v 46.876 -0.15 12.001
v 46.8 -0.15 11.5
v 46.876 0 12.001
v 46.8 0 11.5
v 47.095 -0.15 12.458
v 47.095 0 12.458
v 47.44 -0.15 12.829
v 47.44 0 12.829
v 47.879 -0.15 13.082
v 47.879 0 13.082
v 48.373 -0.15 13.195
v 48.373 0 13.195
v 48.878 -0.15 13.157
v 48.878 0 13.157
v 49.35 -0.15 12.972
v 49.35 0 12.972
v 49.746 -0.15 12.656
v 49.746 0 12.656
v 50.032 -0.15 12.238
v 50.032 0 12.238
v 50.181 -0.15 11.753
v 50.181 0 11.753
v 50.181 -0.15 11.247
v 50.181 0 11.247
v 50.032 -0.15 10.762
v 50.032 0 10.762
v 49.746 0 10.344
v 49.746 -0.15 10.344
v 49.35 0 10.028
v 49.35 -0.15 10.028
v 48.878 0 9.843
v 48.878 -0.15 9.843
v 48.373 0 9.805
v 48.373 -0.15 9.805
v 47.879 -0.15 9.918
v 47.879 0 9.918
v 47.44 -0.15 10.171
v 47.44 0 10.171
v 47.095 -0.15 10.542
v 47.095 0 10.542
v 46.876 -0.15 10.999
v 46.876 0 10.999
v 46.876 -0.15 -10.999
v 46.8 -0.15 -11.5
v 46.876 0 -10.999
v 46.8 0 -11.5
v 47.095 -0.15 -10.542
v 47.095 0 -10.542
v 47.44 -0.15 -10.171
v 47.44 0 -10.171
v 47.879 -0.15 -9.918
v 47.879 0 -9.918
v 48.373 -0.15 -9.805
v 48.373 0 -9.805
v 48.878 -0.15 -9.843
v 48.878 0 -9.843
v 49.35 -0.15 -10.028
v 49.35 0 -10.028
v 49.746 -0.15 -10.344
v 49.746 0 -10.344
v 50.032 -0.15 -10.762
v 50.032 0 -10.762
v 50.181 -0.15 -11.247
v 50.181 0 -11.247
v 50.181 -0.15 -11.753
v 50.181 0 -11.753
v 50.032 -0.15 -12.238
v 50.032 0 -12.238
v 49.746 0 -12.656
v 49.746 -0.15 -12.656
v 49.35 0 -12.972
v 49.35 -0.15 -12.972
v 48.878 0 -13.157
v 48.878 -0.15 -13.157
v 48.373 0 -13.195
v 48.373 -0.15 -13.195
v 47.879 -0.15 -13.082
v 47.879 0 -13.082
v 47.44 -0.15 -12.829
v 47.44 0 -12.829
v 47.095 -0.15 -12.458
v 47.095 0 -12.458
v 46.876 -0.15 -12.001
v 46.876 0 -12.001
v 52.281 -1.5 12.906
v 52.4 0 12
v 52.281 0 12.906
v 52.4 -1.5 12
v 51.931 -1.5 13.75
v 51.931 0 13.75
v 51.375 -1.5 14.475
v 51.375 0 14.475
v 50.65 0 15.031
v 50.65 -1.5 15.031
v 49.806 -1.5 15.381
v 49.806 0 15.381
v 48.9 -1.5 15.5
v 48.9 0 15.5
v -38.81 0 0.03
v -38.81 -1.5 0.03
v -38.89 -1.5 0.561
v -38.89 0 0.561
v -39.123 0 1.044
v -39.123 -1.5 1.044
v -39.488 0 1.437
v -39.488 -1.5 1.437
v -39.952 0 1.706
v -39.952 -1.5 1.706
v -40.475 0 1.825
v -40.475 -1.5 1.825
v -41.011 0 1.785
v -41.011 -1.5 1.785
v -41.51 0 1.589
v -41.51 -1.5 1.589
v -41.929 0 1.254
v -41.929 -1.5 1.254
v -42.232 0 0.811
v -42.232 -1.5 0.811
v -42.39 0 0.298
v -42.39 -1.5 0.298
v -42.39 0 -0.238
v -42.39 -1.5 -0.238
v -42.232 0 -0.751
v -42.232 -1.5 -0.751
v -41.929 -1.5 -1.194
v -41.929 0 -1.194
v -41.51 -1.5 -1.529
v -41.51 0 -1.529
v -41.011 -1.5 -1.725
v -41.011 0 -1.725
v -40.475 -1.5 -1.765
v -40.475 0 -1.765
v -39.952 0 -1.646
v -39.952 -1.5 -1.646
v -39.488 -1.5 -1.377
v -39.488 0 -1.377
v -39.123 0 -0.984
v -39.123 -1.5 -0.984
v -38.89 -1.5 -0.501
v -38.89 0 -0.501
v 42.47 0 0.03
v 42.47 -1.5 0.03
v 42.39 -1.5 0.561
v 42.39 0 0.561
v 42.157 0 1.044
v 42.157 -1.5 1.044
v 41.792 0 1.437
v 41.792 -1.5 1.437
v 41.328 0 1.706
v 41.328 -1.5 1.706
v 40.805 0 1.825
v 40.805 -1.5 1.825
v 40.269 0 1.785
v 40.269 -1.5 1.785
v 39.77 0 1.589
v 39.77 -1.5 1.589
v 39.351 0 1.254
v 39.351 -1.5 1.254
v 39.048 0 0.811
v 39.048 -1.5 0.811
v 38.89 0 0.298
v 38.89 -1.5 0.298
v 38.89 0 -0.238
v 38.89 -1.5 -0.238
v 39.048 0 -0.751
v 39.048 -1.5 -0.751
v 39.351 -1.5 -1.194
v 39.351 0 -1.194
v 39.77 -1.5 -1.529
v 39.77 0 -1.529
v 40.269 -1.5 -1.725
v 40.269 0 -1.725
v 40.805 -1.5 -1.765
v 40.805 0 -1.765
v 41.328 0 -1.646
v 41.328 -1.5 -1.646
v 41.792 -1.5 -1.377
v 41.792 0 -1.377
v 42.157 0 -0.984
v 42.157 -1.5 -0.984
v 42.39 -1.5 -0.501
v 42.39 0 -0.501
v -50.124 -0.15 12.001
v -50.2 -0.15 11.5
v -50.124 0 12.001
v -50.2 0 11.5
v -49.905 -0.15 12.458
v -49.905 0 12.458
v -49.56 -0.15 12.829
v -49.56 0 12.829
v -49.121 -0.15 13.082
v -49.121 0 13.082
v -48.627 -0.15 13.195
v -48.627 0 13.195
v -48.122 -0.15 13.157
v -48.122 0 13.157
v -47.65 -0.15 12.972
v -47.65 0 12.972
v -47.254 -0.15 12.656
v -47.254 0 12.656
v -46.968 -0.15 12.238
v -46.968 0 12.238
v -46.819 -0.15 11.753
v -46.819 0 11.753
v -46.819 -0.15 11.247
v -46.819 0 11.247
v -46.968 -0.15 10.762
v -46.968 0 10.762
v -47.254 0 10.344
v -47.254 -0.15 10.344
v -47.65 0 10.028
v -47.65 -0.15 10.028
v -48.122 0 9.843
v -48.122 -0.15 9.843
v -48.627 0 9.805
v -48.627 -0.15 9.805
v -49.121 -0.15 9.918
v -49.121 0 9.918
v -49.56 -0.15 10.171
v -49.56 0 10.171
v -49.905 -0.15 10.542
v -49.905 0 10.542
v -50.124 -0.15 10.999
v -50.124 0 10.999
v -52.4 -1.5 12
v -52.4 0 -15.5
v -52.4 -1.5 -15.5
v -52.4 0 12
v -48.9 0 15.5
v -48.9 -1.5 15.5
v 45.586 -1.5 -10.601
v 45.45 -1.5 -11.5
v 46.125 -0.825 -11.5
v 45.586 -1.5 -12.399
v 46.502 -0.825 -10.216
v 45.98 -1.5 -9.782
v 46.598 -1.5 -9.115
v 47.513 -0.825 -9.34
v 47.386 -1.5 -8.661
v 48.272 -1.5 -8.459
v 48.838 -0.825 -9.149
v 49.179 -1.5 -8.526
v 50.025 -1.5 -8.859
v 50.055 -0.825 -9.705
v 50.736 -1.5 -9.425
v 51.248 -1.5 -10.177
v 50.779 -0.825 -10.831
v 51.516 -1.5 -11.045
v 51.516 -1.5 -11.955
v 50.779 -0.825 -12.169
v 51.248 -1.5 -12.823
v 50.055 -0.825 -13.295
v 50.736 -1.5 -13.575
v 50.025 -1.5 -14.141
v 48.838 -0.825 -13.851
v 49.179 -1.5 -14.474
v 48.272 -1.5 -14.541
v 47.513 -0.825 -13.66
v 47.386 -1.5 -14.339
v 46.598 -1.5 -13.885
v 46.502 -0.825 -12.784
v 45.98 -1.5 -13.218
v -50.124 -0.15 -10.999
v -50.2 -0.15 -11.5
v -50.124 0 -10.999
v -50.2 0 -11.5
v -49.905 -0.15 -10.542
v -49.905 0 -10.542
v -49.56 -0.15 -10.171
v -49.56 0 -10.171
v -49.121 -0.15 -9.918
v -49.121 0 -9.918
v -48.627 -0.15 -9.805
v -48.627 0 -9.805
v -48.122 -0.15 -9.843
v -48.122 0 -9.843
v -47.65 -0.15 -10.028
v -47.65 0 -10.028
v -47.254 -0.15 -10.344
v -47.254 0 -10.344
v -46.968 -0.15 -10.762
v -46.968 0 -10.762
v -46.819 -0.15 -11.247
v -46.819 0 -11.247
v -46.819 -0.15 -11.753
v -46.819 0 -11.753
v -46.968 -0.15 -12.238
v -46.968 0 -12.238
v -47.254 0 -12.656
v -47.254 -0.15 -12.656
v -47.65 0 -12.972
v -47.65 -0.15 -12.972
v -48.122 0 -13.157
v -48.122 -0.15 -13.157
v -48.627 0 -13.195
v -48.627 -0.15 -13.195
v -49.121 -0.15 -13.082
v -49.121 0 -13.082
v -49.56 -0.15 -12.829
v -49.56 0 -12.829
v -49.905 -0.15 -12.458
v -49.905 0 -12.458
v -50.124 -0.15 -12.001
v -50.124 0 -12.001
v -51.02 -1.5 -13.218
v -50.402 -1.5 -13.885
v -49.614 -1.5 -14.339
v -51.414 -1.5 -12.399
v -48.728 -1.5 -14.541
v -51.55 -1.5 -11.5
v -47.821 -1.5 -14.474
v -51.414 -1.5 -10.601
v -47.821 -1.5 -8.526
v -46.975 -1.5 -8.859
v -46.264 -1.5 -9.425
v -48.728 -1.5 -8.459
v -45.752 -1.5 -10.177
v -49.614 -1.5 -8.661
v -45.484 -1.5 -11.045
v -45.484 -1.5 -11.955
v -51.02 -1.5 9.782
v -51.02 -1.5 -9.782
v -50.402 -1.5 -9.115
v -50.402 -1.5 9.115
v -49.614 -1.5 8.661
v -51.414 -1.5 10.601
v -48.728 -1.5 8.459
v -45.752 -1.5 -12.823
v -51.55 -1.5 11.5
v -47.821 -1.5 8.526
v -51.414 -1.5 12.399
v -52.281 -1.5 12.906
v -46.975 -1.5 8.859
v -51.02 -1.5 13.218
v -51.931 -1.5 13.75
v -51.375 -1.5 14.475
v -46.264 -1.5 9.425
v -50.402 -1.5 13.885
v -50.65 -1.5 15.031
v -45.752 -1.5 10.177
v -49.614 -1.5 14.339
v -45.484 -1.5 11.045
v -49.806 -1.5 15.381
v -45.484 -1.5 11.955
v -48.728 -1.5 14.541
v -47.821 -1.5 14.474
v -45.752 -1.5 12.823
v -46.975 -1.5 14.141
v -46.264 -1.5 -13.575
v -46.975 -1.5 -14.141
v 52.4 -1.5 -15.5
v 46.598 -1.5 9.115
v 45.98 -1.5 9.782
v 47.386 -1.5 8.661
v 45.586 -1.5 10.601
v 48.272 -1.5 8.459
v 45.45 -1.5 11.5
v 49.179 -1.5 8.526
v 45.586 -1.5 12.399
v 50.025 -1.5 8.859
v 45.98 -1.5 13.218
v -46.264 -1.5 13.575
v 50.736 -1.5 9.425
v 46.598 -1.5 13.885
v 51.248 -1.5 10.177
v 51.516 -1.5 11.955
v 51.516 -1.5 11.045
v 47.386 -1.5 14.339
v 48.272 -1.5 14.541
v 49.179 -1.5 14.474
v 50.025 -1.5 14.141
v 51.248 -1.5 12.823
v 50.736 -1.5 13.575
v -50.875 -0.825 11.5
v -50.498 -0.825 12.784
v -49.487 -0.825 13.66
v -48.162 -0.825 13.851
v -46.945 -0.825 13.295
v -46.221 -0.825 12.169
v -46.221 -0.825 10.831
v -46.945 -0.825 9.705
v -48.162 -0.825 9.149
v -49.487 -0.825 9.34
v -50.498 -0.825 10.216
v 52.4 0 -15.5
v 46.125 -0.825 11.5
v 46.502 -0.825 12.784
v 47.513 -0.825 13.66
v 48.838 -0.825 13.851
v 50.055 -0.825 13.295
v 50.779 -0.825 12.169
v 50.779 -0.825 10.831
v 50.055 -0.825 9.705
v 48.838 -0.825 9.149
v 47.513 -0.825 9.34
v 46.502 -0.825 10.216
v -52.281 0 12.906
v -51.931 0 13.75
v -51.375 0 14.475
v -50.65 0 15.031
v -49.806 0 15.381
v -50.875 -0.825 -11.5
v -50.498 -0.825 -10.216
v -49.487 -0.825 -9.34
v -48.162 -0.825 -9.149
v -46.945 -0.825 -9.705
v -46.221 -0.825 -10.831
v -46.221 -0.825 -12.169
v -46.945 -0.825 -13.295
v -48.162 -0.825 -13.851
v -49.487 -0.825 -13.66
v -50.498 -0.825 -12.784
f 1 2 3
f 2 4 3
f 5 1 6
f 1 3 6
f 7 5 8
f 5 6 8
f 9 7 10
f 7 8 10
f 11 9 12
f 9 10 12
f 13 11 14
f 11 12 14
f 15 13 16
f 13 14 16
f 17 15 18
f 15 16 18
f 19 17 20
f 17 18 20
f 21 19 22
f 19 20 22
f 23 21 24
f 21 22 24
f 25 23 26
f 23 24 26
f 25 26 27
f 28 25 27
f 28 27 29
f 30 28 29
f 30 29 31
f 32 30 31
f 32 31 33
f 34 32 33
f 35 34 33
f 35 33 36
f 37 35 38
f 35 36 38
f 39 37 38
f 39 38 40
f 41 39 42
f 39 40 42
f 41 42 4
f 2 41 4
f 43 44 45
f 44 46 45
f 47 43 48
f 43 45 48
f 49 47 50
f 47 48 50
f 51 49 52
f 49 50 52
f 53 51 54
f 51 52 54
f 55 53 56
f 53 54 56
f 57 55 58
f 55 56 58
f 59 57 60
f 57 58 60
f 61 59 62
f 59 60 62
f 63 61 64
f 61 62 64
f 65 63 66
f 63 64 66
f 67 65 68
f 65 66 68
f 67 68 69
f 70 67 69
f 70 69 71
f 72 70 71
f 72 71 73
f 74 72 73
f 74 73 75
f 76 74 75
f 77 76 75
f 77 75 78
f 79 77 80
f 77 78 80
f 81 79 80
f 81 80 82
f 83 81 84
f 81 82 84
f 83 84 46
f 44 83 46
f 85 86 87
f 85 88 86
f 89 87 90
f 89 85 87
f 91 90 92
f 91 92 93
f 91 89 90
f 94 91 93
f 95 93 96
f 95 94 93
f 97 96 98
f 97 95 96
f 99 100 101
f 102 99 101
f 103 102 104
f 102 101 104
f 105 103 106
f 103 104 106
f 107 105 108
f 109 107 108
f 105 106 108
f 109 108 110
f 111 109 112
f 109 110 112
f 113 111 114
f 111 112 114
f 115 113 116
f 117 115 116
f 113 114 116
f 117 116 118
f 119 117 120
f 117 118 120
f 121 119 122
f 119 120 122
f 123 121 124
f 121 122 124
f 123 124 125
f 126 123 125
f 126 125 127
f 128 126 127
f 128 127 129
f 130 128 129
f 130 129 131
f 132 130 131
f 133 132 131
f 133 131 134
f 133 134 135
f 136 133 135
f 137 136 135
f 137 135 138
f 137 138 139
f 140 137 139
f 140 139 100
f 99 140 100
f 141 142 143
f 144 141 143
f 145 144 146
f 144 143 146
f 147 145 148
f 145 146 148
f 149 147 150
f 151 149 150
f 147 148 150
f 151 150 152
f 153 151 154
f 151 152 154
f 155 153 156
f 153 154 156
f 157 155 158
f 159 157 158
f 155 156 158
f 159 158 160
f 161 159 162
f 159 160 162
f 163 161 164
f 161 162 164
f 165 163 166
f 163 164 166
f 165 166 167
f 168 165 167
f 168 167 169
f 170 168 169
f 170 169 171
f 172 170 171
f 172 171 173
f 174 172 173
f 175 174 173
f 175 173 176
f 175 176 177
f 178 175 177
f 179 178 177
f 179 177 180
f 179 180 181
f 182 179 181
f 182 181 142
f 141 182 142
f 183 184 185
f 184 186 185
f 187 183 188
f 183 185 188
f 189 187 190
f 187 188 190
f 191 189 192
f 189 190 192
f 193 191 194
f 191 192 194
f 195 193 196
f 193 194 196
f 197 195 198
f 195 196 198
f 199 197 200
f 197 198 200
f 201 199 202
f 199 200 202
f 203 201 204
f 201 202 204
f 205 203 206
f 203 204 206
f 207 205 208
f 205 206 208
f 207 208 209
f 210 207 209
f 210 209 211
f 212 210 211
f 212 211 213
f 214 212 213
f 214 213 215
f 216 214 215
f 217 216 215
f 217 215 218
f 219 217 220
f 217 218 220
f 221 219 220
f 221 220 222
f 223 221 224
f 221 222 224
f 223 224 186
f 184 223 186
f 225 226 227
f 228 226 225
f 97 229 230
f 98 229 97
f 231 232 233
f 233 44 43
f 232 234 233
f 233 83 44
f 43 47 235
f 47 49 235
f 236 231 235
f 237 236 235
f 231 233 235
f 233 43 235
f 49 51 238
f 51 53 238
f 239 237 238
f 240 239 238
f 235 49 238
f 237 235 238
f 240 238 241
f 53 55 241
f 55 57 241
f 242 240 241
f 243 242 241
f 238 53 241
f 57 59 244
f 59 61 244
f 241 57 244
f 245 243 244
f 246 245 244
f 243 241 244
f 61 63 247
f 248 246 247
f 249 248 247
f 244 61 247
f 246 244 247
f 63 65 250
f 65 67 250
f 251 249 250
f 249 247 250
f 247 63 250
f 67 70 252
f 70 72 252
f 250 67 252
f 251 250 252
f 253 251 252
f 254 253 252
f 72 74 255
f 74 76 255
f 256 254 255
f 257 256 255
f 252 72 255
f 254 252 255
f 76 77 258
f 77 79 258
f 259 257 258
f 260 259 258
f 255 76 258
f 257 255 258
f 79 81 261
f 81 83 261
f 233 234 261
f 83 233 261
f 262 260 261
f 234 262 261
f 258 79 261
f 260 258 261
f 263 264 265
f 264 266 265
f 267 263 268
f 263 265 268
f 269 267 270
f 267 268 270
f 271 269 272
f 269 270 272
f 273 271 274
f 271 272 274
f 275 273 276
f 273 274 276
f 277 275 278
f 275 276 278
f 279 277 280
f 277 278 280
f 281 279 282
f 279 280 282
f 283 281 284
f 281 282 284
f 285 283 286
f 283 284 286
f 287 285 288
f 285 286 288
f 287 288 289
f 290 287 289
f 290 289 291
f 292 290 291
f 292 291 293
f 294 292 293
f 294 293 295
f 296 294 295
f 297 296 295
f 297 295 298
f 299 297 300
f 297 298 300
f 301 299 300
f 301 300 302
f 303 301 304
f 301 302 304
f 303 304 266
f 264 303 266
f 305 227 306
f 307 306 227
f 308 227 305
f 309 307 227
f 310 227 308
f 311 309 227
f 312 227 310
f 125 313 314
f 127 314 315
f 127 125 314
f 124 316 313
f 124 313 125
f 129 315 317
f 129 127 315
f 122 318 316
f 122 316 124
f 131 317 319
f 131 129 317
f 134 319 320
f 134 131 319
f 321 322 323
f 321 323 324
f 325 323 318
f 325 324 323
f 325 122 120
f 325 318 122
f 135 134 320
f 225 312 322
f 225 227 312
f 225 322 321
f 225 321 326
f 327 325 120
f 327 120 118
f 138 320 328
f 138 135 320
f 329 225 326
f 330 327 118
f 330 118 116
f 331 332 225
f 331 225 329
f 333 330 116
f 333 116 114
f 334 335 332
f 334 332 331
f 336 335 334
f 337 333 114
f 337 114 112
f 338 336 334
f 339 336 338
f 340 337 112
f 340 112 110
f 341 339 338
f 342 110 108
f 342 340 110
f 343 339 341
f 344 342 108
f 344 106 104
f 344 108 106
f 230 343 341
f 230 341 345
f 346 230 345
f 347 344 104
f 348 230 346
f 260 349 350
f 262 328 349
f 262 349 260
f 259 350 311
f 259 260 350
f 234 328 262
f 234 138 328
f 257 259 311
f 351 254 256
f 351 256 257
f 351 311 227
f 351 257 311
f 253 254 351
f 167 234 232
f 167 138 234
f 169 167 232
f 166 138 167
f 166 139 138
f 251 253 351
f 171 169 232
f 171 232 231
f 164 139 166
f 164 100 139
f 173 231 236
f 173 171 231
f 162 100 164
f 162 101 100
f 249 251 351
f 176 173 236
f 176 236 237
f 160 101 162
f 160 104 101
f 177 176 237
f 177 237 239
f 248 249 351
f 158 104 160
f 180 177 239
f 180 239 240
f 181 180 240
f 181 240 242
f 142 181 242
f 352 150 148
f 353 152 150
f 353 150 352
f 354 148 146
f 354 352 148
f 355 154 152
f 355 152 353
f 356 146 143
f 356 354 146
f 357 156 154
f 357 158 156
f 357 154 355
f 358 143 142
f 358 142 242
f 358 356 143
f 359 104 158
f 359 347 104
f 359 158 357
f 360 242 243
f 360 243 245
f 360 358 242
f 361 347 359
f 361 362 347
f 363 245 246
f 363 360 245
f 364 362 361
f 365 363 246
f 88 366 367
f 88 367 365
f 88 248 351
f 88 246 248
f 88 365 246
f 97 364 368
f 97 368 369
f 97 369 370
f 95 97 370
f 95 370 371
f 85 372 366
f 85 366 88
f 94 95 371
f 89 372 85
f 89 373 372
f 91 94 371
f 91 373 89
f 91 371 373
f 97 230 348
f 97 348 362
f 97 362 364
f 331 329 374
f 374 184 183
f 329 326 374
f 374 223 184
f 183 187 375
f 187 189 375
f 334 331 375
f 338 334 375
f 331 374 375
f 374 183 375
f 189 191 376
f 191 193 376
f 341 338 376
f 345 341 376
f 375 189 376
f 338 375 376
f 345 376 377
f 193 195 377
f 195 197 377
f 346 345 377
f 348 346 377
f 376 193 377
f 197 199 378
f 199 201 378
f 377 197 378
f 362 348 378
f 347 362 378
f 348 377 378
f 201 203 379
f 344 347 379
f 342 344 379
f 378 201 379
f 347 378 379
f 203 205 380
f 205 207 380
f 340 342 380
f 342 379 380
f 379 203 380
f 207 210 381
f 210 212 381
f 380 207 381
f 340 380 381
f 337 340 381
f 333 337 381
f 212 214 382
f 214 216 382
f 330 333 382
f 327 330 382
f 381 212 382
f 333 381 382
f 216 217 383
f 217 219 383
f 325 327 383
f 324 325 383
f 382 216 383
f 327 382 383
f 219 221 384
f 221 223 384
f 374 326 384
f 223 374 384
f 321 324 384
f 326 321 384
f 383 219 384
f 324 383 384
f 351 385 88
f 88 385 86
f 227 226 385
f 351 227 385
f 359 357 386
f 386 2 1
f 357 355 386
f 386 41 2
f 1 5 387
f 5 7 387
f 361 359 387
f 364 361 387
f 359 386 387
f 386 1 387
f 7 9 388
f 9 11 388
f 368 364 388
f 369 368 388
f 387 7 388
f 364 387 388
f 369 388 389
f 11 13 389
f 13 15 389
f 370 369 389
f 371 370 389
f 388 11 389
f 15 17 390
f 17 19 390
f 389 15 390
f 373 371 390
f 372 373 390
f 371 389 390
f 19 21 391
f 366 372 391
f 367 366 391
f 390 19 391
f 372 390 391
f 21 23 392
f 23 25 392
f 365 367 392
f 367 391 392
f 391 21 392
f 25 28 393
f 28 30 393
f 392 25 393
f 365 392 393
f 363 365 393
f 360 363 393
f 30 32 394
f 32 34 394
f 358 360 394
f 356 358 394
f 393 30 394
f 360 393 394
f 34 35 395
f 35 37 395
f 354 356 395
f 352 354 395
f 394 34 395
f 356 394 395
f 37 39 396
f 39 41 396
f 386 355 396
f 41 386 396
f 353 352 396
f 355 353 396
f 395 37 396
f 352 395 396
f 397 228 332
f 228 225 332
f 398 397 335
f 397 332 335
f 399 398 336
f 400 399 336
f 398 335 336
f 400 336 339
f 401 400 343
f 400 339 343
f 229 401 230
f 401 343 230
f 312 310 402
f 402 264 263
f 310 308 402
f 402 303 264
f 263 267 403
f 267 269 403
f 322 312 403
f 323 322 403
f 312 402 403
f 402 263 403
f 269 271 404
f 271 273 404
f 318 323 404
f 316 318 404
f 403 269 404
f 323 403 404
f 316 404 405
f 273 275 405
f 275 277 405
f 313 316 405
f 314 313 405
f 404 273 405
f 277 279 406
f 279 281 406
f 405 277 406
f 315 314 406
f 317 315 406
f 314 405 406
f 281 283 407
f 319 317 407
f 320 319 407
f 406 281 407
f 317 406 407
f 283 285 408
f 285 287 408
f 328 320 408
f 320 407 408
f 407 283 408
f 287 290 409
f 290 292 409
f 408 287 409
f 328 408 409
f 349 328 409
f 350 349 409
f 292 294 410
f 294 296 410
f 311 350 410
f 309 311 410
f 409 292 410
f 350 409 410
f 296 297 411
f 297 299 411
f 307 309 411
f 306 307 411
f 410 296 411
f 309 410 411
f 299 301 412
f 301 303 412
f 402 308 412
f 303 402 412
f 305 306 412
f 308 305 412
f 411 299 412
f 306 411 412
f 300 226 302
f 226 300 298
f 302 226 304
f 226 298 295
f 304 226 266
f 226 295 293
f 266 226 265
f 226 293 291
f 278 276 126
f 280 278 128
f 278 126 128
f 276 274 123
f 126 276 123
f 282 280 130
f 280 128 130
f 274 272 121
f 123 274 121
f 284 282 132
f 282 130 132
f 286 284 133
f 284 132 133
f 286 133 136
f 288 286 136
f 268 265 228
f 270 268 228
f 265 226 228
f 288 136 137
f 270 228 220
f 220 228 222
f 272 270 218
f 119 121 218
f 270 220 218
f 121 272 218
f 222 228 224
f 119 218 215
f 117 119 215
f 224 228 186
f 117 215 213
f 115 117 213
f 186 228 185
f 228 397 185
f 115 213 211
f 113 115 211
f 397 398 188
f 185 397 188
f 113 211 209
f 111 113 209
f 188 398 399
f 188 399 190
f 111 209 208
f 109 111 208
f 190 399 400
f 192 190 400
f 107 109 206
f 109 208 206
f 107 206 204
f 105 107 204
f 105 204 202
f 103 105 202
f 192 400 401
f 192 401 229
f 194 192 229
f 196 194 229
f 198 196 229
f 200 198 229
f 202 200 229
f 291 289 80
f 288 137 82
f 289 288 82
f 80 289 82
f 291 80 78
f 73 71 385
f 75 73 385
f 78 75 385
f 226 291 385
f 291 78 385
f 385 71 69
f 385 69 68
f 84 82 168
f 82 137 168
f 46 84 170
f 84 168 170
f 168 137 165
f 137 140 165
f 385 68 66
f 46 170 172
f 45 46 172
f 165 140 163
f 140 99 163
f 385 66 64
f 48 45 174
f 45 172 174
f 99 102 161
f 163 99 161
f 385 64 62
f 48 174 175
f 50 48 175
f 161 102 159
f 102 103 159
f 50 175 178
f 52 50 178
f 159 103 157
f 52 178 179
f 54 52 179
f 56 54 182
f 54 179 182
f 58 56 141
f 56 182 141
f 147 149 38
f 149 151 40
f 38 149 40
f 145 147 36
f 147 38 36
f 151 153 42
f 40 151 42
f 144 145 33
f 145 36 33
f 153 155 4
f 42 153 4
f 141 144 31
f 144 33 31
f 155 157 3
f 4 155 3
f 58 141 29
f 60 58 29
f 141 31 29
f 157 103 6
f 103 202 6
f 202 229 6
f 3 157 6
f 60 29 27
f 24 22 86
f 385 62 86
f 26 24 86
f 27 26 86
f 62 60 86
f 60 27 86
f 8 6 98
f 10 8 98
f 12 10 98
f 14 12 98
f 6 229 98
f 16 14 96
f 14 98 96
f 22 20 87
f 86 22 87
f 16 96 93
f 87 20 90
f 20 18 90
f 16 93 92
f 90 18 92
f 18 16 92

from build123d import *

# Parameters (mm, degrees)
SKETCH_W            = 104.8
SKETCH_H            = 31
PAD_DEPTH           = 1.5
HOLE_D              = 3.4
HOLE_DEPTH          = 25
HOLE_CSINK_D        = 6.1
HOLE_CSINK_ANGLE    = 90
FILLET_R            = 3.5
SKETCH002_R         = 1.8
POCKET_DEPTH        = 1.501
LINEARPATTERN_COUNT = 2
LINEARPATTERN_PITCH = 81.28


with BuildPart() as part:
    # Sketch → Pad (new body)
    with BuildSketch(Plane.XZ):
        Rectangle(SKETCH_W, SKETCH_H)
    extrude(amount=PAD_DEPTH)

    # Hole
    with Locations(Plane.XZ.offset(1.5)):
        with Locations((-48.5, 11.5), (-48.5, -11.5), (48.5, -11.5), (48.5, 11.5)):
            CounterSinkHole(HOLE_D / 2, HOLE_CSINK_D / 2, depth=HOLE_DEPTH, counter_sink_angle=HOLE_CSINK_ANGLE)

    # Fillet
    fillet_edges = [part.edges().sort_by_distance(p)[0] for p in [
        (-52.4, -0.75, 15.5),
        (52.4, -0.75, 15.5),
    ]]
    fillet(fillet_edges, radius=FILLET_R)

    # Sketch002 (on Face5 of Fillet) → Pocket (cut, through all)
    with BuildSketch(Plane.XZ.offset(1.5)):
        with Locations((-40.61, 0.03)):
            Circle(SKETCH002_R)
    pocket = extrude(amount=-POCKET_DEPTH, mode=Mode.SUBTRACT)

    # LinearPattern: Pocket ×2
    with Locations(*[(i * LINEARPATTERN_PITCH, 0, 0) for i in range(1, LINEARPATTERN_COUNT)]):
        add(pocket, mode=Mode.SUBTRACT)


solid = part.part
